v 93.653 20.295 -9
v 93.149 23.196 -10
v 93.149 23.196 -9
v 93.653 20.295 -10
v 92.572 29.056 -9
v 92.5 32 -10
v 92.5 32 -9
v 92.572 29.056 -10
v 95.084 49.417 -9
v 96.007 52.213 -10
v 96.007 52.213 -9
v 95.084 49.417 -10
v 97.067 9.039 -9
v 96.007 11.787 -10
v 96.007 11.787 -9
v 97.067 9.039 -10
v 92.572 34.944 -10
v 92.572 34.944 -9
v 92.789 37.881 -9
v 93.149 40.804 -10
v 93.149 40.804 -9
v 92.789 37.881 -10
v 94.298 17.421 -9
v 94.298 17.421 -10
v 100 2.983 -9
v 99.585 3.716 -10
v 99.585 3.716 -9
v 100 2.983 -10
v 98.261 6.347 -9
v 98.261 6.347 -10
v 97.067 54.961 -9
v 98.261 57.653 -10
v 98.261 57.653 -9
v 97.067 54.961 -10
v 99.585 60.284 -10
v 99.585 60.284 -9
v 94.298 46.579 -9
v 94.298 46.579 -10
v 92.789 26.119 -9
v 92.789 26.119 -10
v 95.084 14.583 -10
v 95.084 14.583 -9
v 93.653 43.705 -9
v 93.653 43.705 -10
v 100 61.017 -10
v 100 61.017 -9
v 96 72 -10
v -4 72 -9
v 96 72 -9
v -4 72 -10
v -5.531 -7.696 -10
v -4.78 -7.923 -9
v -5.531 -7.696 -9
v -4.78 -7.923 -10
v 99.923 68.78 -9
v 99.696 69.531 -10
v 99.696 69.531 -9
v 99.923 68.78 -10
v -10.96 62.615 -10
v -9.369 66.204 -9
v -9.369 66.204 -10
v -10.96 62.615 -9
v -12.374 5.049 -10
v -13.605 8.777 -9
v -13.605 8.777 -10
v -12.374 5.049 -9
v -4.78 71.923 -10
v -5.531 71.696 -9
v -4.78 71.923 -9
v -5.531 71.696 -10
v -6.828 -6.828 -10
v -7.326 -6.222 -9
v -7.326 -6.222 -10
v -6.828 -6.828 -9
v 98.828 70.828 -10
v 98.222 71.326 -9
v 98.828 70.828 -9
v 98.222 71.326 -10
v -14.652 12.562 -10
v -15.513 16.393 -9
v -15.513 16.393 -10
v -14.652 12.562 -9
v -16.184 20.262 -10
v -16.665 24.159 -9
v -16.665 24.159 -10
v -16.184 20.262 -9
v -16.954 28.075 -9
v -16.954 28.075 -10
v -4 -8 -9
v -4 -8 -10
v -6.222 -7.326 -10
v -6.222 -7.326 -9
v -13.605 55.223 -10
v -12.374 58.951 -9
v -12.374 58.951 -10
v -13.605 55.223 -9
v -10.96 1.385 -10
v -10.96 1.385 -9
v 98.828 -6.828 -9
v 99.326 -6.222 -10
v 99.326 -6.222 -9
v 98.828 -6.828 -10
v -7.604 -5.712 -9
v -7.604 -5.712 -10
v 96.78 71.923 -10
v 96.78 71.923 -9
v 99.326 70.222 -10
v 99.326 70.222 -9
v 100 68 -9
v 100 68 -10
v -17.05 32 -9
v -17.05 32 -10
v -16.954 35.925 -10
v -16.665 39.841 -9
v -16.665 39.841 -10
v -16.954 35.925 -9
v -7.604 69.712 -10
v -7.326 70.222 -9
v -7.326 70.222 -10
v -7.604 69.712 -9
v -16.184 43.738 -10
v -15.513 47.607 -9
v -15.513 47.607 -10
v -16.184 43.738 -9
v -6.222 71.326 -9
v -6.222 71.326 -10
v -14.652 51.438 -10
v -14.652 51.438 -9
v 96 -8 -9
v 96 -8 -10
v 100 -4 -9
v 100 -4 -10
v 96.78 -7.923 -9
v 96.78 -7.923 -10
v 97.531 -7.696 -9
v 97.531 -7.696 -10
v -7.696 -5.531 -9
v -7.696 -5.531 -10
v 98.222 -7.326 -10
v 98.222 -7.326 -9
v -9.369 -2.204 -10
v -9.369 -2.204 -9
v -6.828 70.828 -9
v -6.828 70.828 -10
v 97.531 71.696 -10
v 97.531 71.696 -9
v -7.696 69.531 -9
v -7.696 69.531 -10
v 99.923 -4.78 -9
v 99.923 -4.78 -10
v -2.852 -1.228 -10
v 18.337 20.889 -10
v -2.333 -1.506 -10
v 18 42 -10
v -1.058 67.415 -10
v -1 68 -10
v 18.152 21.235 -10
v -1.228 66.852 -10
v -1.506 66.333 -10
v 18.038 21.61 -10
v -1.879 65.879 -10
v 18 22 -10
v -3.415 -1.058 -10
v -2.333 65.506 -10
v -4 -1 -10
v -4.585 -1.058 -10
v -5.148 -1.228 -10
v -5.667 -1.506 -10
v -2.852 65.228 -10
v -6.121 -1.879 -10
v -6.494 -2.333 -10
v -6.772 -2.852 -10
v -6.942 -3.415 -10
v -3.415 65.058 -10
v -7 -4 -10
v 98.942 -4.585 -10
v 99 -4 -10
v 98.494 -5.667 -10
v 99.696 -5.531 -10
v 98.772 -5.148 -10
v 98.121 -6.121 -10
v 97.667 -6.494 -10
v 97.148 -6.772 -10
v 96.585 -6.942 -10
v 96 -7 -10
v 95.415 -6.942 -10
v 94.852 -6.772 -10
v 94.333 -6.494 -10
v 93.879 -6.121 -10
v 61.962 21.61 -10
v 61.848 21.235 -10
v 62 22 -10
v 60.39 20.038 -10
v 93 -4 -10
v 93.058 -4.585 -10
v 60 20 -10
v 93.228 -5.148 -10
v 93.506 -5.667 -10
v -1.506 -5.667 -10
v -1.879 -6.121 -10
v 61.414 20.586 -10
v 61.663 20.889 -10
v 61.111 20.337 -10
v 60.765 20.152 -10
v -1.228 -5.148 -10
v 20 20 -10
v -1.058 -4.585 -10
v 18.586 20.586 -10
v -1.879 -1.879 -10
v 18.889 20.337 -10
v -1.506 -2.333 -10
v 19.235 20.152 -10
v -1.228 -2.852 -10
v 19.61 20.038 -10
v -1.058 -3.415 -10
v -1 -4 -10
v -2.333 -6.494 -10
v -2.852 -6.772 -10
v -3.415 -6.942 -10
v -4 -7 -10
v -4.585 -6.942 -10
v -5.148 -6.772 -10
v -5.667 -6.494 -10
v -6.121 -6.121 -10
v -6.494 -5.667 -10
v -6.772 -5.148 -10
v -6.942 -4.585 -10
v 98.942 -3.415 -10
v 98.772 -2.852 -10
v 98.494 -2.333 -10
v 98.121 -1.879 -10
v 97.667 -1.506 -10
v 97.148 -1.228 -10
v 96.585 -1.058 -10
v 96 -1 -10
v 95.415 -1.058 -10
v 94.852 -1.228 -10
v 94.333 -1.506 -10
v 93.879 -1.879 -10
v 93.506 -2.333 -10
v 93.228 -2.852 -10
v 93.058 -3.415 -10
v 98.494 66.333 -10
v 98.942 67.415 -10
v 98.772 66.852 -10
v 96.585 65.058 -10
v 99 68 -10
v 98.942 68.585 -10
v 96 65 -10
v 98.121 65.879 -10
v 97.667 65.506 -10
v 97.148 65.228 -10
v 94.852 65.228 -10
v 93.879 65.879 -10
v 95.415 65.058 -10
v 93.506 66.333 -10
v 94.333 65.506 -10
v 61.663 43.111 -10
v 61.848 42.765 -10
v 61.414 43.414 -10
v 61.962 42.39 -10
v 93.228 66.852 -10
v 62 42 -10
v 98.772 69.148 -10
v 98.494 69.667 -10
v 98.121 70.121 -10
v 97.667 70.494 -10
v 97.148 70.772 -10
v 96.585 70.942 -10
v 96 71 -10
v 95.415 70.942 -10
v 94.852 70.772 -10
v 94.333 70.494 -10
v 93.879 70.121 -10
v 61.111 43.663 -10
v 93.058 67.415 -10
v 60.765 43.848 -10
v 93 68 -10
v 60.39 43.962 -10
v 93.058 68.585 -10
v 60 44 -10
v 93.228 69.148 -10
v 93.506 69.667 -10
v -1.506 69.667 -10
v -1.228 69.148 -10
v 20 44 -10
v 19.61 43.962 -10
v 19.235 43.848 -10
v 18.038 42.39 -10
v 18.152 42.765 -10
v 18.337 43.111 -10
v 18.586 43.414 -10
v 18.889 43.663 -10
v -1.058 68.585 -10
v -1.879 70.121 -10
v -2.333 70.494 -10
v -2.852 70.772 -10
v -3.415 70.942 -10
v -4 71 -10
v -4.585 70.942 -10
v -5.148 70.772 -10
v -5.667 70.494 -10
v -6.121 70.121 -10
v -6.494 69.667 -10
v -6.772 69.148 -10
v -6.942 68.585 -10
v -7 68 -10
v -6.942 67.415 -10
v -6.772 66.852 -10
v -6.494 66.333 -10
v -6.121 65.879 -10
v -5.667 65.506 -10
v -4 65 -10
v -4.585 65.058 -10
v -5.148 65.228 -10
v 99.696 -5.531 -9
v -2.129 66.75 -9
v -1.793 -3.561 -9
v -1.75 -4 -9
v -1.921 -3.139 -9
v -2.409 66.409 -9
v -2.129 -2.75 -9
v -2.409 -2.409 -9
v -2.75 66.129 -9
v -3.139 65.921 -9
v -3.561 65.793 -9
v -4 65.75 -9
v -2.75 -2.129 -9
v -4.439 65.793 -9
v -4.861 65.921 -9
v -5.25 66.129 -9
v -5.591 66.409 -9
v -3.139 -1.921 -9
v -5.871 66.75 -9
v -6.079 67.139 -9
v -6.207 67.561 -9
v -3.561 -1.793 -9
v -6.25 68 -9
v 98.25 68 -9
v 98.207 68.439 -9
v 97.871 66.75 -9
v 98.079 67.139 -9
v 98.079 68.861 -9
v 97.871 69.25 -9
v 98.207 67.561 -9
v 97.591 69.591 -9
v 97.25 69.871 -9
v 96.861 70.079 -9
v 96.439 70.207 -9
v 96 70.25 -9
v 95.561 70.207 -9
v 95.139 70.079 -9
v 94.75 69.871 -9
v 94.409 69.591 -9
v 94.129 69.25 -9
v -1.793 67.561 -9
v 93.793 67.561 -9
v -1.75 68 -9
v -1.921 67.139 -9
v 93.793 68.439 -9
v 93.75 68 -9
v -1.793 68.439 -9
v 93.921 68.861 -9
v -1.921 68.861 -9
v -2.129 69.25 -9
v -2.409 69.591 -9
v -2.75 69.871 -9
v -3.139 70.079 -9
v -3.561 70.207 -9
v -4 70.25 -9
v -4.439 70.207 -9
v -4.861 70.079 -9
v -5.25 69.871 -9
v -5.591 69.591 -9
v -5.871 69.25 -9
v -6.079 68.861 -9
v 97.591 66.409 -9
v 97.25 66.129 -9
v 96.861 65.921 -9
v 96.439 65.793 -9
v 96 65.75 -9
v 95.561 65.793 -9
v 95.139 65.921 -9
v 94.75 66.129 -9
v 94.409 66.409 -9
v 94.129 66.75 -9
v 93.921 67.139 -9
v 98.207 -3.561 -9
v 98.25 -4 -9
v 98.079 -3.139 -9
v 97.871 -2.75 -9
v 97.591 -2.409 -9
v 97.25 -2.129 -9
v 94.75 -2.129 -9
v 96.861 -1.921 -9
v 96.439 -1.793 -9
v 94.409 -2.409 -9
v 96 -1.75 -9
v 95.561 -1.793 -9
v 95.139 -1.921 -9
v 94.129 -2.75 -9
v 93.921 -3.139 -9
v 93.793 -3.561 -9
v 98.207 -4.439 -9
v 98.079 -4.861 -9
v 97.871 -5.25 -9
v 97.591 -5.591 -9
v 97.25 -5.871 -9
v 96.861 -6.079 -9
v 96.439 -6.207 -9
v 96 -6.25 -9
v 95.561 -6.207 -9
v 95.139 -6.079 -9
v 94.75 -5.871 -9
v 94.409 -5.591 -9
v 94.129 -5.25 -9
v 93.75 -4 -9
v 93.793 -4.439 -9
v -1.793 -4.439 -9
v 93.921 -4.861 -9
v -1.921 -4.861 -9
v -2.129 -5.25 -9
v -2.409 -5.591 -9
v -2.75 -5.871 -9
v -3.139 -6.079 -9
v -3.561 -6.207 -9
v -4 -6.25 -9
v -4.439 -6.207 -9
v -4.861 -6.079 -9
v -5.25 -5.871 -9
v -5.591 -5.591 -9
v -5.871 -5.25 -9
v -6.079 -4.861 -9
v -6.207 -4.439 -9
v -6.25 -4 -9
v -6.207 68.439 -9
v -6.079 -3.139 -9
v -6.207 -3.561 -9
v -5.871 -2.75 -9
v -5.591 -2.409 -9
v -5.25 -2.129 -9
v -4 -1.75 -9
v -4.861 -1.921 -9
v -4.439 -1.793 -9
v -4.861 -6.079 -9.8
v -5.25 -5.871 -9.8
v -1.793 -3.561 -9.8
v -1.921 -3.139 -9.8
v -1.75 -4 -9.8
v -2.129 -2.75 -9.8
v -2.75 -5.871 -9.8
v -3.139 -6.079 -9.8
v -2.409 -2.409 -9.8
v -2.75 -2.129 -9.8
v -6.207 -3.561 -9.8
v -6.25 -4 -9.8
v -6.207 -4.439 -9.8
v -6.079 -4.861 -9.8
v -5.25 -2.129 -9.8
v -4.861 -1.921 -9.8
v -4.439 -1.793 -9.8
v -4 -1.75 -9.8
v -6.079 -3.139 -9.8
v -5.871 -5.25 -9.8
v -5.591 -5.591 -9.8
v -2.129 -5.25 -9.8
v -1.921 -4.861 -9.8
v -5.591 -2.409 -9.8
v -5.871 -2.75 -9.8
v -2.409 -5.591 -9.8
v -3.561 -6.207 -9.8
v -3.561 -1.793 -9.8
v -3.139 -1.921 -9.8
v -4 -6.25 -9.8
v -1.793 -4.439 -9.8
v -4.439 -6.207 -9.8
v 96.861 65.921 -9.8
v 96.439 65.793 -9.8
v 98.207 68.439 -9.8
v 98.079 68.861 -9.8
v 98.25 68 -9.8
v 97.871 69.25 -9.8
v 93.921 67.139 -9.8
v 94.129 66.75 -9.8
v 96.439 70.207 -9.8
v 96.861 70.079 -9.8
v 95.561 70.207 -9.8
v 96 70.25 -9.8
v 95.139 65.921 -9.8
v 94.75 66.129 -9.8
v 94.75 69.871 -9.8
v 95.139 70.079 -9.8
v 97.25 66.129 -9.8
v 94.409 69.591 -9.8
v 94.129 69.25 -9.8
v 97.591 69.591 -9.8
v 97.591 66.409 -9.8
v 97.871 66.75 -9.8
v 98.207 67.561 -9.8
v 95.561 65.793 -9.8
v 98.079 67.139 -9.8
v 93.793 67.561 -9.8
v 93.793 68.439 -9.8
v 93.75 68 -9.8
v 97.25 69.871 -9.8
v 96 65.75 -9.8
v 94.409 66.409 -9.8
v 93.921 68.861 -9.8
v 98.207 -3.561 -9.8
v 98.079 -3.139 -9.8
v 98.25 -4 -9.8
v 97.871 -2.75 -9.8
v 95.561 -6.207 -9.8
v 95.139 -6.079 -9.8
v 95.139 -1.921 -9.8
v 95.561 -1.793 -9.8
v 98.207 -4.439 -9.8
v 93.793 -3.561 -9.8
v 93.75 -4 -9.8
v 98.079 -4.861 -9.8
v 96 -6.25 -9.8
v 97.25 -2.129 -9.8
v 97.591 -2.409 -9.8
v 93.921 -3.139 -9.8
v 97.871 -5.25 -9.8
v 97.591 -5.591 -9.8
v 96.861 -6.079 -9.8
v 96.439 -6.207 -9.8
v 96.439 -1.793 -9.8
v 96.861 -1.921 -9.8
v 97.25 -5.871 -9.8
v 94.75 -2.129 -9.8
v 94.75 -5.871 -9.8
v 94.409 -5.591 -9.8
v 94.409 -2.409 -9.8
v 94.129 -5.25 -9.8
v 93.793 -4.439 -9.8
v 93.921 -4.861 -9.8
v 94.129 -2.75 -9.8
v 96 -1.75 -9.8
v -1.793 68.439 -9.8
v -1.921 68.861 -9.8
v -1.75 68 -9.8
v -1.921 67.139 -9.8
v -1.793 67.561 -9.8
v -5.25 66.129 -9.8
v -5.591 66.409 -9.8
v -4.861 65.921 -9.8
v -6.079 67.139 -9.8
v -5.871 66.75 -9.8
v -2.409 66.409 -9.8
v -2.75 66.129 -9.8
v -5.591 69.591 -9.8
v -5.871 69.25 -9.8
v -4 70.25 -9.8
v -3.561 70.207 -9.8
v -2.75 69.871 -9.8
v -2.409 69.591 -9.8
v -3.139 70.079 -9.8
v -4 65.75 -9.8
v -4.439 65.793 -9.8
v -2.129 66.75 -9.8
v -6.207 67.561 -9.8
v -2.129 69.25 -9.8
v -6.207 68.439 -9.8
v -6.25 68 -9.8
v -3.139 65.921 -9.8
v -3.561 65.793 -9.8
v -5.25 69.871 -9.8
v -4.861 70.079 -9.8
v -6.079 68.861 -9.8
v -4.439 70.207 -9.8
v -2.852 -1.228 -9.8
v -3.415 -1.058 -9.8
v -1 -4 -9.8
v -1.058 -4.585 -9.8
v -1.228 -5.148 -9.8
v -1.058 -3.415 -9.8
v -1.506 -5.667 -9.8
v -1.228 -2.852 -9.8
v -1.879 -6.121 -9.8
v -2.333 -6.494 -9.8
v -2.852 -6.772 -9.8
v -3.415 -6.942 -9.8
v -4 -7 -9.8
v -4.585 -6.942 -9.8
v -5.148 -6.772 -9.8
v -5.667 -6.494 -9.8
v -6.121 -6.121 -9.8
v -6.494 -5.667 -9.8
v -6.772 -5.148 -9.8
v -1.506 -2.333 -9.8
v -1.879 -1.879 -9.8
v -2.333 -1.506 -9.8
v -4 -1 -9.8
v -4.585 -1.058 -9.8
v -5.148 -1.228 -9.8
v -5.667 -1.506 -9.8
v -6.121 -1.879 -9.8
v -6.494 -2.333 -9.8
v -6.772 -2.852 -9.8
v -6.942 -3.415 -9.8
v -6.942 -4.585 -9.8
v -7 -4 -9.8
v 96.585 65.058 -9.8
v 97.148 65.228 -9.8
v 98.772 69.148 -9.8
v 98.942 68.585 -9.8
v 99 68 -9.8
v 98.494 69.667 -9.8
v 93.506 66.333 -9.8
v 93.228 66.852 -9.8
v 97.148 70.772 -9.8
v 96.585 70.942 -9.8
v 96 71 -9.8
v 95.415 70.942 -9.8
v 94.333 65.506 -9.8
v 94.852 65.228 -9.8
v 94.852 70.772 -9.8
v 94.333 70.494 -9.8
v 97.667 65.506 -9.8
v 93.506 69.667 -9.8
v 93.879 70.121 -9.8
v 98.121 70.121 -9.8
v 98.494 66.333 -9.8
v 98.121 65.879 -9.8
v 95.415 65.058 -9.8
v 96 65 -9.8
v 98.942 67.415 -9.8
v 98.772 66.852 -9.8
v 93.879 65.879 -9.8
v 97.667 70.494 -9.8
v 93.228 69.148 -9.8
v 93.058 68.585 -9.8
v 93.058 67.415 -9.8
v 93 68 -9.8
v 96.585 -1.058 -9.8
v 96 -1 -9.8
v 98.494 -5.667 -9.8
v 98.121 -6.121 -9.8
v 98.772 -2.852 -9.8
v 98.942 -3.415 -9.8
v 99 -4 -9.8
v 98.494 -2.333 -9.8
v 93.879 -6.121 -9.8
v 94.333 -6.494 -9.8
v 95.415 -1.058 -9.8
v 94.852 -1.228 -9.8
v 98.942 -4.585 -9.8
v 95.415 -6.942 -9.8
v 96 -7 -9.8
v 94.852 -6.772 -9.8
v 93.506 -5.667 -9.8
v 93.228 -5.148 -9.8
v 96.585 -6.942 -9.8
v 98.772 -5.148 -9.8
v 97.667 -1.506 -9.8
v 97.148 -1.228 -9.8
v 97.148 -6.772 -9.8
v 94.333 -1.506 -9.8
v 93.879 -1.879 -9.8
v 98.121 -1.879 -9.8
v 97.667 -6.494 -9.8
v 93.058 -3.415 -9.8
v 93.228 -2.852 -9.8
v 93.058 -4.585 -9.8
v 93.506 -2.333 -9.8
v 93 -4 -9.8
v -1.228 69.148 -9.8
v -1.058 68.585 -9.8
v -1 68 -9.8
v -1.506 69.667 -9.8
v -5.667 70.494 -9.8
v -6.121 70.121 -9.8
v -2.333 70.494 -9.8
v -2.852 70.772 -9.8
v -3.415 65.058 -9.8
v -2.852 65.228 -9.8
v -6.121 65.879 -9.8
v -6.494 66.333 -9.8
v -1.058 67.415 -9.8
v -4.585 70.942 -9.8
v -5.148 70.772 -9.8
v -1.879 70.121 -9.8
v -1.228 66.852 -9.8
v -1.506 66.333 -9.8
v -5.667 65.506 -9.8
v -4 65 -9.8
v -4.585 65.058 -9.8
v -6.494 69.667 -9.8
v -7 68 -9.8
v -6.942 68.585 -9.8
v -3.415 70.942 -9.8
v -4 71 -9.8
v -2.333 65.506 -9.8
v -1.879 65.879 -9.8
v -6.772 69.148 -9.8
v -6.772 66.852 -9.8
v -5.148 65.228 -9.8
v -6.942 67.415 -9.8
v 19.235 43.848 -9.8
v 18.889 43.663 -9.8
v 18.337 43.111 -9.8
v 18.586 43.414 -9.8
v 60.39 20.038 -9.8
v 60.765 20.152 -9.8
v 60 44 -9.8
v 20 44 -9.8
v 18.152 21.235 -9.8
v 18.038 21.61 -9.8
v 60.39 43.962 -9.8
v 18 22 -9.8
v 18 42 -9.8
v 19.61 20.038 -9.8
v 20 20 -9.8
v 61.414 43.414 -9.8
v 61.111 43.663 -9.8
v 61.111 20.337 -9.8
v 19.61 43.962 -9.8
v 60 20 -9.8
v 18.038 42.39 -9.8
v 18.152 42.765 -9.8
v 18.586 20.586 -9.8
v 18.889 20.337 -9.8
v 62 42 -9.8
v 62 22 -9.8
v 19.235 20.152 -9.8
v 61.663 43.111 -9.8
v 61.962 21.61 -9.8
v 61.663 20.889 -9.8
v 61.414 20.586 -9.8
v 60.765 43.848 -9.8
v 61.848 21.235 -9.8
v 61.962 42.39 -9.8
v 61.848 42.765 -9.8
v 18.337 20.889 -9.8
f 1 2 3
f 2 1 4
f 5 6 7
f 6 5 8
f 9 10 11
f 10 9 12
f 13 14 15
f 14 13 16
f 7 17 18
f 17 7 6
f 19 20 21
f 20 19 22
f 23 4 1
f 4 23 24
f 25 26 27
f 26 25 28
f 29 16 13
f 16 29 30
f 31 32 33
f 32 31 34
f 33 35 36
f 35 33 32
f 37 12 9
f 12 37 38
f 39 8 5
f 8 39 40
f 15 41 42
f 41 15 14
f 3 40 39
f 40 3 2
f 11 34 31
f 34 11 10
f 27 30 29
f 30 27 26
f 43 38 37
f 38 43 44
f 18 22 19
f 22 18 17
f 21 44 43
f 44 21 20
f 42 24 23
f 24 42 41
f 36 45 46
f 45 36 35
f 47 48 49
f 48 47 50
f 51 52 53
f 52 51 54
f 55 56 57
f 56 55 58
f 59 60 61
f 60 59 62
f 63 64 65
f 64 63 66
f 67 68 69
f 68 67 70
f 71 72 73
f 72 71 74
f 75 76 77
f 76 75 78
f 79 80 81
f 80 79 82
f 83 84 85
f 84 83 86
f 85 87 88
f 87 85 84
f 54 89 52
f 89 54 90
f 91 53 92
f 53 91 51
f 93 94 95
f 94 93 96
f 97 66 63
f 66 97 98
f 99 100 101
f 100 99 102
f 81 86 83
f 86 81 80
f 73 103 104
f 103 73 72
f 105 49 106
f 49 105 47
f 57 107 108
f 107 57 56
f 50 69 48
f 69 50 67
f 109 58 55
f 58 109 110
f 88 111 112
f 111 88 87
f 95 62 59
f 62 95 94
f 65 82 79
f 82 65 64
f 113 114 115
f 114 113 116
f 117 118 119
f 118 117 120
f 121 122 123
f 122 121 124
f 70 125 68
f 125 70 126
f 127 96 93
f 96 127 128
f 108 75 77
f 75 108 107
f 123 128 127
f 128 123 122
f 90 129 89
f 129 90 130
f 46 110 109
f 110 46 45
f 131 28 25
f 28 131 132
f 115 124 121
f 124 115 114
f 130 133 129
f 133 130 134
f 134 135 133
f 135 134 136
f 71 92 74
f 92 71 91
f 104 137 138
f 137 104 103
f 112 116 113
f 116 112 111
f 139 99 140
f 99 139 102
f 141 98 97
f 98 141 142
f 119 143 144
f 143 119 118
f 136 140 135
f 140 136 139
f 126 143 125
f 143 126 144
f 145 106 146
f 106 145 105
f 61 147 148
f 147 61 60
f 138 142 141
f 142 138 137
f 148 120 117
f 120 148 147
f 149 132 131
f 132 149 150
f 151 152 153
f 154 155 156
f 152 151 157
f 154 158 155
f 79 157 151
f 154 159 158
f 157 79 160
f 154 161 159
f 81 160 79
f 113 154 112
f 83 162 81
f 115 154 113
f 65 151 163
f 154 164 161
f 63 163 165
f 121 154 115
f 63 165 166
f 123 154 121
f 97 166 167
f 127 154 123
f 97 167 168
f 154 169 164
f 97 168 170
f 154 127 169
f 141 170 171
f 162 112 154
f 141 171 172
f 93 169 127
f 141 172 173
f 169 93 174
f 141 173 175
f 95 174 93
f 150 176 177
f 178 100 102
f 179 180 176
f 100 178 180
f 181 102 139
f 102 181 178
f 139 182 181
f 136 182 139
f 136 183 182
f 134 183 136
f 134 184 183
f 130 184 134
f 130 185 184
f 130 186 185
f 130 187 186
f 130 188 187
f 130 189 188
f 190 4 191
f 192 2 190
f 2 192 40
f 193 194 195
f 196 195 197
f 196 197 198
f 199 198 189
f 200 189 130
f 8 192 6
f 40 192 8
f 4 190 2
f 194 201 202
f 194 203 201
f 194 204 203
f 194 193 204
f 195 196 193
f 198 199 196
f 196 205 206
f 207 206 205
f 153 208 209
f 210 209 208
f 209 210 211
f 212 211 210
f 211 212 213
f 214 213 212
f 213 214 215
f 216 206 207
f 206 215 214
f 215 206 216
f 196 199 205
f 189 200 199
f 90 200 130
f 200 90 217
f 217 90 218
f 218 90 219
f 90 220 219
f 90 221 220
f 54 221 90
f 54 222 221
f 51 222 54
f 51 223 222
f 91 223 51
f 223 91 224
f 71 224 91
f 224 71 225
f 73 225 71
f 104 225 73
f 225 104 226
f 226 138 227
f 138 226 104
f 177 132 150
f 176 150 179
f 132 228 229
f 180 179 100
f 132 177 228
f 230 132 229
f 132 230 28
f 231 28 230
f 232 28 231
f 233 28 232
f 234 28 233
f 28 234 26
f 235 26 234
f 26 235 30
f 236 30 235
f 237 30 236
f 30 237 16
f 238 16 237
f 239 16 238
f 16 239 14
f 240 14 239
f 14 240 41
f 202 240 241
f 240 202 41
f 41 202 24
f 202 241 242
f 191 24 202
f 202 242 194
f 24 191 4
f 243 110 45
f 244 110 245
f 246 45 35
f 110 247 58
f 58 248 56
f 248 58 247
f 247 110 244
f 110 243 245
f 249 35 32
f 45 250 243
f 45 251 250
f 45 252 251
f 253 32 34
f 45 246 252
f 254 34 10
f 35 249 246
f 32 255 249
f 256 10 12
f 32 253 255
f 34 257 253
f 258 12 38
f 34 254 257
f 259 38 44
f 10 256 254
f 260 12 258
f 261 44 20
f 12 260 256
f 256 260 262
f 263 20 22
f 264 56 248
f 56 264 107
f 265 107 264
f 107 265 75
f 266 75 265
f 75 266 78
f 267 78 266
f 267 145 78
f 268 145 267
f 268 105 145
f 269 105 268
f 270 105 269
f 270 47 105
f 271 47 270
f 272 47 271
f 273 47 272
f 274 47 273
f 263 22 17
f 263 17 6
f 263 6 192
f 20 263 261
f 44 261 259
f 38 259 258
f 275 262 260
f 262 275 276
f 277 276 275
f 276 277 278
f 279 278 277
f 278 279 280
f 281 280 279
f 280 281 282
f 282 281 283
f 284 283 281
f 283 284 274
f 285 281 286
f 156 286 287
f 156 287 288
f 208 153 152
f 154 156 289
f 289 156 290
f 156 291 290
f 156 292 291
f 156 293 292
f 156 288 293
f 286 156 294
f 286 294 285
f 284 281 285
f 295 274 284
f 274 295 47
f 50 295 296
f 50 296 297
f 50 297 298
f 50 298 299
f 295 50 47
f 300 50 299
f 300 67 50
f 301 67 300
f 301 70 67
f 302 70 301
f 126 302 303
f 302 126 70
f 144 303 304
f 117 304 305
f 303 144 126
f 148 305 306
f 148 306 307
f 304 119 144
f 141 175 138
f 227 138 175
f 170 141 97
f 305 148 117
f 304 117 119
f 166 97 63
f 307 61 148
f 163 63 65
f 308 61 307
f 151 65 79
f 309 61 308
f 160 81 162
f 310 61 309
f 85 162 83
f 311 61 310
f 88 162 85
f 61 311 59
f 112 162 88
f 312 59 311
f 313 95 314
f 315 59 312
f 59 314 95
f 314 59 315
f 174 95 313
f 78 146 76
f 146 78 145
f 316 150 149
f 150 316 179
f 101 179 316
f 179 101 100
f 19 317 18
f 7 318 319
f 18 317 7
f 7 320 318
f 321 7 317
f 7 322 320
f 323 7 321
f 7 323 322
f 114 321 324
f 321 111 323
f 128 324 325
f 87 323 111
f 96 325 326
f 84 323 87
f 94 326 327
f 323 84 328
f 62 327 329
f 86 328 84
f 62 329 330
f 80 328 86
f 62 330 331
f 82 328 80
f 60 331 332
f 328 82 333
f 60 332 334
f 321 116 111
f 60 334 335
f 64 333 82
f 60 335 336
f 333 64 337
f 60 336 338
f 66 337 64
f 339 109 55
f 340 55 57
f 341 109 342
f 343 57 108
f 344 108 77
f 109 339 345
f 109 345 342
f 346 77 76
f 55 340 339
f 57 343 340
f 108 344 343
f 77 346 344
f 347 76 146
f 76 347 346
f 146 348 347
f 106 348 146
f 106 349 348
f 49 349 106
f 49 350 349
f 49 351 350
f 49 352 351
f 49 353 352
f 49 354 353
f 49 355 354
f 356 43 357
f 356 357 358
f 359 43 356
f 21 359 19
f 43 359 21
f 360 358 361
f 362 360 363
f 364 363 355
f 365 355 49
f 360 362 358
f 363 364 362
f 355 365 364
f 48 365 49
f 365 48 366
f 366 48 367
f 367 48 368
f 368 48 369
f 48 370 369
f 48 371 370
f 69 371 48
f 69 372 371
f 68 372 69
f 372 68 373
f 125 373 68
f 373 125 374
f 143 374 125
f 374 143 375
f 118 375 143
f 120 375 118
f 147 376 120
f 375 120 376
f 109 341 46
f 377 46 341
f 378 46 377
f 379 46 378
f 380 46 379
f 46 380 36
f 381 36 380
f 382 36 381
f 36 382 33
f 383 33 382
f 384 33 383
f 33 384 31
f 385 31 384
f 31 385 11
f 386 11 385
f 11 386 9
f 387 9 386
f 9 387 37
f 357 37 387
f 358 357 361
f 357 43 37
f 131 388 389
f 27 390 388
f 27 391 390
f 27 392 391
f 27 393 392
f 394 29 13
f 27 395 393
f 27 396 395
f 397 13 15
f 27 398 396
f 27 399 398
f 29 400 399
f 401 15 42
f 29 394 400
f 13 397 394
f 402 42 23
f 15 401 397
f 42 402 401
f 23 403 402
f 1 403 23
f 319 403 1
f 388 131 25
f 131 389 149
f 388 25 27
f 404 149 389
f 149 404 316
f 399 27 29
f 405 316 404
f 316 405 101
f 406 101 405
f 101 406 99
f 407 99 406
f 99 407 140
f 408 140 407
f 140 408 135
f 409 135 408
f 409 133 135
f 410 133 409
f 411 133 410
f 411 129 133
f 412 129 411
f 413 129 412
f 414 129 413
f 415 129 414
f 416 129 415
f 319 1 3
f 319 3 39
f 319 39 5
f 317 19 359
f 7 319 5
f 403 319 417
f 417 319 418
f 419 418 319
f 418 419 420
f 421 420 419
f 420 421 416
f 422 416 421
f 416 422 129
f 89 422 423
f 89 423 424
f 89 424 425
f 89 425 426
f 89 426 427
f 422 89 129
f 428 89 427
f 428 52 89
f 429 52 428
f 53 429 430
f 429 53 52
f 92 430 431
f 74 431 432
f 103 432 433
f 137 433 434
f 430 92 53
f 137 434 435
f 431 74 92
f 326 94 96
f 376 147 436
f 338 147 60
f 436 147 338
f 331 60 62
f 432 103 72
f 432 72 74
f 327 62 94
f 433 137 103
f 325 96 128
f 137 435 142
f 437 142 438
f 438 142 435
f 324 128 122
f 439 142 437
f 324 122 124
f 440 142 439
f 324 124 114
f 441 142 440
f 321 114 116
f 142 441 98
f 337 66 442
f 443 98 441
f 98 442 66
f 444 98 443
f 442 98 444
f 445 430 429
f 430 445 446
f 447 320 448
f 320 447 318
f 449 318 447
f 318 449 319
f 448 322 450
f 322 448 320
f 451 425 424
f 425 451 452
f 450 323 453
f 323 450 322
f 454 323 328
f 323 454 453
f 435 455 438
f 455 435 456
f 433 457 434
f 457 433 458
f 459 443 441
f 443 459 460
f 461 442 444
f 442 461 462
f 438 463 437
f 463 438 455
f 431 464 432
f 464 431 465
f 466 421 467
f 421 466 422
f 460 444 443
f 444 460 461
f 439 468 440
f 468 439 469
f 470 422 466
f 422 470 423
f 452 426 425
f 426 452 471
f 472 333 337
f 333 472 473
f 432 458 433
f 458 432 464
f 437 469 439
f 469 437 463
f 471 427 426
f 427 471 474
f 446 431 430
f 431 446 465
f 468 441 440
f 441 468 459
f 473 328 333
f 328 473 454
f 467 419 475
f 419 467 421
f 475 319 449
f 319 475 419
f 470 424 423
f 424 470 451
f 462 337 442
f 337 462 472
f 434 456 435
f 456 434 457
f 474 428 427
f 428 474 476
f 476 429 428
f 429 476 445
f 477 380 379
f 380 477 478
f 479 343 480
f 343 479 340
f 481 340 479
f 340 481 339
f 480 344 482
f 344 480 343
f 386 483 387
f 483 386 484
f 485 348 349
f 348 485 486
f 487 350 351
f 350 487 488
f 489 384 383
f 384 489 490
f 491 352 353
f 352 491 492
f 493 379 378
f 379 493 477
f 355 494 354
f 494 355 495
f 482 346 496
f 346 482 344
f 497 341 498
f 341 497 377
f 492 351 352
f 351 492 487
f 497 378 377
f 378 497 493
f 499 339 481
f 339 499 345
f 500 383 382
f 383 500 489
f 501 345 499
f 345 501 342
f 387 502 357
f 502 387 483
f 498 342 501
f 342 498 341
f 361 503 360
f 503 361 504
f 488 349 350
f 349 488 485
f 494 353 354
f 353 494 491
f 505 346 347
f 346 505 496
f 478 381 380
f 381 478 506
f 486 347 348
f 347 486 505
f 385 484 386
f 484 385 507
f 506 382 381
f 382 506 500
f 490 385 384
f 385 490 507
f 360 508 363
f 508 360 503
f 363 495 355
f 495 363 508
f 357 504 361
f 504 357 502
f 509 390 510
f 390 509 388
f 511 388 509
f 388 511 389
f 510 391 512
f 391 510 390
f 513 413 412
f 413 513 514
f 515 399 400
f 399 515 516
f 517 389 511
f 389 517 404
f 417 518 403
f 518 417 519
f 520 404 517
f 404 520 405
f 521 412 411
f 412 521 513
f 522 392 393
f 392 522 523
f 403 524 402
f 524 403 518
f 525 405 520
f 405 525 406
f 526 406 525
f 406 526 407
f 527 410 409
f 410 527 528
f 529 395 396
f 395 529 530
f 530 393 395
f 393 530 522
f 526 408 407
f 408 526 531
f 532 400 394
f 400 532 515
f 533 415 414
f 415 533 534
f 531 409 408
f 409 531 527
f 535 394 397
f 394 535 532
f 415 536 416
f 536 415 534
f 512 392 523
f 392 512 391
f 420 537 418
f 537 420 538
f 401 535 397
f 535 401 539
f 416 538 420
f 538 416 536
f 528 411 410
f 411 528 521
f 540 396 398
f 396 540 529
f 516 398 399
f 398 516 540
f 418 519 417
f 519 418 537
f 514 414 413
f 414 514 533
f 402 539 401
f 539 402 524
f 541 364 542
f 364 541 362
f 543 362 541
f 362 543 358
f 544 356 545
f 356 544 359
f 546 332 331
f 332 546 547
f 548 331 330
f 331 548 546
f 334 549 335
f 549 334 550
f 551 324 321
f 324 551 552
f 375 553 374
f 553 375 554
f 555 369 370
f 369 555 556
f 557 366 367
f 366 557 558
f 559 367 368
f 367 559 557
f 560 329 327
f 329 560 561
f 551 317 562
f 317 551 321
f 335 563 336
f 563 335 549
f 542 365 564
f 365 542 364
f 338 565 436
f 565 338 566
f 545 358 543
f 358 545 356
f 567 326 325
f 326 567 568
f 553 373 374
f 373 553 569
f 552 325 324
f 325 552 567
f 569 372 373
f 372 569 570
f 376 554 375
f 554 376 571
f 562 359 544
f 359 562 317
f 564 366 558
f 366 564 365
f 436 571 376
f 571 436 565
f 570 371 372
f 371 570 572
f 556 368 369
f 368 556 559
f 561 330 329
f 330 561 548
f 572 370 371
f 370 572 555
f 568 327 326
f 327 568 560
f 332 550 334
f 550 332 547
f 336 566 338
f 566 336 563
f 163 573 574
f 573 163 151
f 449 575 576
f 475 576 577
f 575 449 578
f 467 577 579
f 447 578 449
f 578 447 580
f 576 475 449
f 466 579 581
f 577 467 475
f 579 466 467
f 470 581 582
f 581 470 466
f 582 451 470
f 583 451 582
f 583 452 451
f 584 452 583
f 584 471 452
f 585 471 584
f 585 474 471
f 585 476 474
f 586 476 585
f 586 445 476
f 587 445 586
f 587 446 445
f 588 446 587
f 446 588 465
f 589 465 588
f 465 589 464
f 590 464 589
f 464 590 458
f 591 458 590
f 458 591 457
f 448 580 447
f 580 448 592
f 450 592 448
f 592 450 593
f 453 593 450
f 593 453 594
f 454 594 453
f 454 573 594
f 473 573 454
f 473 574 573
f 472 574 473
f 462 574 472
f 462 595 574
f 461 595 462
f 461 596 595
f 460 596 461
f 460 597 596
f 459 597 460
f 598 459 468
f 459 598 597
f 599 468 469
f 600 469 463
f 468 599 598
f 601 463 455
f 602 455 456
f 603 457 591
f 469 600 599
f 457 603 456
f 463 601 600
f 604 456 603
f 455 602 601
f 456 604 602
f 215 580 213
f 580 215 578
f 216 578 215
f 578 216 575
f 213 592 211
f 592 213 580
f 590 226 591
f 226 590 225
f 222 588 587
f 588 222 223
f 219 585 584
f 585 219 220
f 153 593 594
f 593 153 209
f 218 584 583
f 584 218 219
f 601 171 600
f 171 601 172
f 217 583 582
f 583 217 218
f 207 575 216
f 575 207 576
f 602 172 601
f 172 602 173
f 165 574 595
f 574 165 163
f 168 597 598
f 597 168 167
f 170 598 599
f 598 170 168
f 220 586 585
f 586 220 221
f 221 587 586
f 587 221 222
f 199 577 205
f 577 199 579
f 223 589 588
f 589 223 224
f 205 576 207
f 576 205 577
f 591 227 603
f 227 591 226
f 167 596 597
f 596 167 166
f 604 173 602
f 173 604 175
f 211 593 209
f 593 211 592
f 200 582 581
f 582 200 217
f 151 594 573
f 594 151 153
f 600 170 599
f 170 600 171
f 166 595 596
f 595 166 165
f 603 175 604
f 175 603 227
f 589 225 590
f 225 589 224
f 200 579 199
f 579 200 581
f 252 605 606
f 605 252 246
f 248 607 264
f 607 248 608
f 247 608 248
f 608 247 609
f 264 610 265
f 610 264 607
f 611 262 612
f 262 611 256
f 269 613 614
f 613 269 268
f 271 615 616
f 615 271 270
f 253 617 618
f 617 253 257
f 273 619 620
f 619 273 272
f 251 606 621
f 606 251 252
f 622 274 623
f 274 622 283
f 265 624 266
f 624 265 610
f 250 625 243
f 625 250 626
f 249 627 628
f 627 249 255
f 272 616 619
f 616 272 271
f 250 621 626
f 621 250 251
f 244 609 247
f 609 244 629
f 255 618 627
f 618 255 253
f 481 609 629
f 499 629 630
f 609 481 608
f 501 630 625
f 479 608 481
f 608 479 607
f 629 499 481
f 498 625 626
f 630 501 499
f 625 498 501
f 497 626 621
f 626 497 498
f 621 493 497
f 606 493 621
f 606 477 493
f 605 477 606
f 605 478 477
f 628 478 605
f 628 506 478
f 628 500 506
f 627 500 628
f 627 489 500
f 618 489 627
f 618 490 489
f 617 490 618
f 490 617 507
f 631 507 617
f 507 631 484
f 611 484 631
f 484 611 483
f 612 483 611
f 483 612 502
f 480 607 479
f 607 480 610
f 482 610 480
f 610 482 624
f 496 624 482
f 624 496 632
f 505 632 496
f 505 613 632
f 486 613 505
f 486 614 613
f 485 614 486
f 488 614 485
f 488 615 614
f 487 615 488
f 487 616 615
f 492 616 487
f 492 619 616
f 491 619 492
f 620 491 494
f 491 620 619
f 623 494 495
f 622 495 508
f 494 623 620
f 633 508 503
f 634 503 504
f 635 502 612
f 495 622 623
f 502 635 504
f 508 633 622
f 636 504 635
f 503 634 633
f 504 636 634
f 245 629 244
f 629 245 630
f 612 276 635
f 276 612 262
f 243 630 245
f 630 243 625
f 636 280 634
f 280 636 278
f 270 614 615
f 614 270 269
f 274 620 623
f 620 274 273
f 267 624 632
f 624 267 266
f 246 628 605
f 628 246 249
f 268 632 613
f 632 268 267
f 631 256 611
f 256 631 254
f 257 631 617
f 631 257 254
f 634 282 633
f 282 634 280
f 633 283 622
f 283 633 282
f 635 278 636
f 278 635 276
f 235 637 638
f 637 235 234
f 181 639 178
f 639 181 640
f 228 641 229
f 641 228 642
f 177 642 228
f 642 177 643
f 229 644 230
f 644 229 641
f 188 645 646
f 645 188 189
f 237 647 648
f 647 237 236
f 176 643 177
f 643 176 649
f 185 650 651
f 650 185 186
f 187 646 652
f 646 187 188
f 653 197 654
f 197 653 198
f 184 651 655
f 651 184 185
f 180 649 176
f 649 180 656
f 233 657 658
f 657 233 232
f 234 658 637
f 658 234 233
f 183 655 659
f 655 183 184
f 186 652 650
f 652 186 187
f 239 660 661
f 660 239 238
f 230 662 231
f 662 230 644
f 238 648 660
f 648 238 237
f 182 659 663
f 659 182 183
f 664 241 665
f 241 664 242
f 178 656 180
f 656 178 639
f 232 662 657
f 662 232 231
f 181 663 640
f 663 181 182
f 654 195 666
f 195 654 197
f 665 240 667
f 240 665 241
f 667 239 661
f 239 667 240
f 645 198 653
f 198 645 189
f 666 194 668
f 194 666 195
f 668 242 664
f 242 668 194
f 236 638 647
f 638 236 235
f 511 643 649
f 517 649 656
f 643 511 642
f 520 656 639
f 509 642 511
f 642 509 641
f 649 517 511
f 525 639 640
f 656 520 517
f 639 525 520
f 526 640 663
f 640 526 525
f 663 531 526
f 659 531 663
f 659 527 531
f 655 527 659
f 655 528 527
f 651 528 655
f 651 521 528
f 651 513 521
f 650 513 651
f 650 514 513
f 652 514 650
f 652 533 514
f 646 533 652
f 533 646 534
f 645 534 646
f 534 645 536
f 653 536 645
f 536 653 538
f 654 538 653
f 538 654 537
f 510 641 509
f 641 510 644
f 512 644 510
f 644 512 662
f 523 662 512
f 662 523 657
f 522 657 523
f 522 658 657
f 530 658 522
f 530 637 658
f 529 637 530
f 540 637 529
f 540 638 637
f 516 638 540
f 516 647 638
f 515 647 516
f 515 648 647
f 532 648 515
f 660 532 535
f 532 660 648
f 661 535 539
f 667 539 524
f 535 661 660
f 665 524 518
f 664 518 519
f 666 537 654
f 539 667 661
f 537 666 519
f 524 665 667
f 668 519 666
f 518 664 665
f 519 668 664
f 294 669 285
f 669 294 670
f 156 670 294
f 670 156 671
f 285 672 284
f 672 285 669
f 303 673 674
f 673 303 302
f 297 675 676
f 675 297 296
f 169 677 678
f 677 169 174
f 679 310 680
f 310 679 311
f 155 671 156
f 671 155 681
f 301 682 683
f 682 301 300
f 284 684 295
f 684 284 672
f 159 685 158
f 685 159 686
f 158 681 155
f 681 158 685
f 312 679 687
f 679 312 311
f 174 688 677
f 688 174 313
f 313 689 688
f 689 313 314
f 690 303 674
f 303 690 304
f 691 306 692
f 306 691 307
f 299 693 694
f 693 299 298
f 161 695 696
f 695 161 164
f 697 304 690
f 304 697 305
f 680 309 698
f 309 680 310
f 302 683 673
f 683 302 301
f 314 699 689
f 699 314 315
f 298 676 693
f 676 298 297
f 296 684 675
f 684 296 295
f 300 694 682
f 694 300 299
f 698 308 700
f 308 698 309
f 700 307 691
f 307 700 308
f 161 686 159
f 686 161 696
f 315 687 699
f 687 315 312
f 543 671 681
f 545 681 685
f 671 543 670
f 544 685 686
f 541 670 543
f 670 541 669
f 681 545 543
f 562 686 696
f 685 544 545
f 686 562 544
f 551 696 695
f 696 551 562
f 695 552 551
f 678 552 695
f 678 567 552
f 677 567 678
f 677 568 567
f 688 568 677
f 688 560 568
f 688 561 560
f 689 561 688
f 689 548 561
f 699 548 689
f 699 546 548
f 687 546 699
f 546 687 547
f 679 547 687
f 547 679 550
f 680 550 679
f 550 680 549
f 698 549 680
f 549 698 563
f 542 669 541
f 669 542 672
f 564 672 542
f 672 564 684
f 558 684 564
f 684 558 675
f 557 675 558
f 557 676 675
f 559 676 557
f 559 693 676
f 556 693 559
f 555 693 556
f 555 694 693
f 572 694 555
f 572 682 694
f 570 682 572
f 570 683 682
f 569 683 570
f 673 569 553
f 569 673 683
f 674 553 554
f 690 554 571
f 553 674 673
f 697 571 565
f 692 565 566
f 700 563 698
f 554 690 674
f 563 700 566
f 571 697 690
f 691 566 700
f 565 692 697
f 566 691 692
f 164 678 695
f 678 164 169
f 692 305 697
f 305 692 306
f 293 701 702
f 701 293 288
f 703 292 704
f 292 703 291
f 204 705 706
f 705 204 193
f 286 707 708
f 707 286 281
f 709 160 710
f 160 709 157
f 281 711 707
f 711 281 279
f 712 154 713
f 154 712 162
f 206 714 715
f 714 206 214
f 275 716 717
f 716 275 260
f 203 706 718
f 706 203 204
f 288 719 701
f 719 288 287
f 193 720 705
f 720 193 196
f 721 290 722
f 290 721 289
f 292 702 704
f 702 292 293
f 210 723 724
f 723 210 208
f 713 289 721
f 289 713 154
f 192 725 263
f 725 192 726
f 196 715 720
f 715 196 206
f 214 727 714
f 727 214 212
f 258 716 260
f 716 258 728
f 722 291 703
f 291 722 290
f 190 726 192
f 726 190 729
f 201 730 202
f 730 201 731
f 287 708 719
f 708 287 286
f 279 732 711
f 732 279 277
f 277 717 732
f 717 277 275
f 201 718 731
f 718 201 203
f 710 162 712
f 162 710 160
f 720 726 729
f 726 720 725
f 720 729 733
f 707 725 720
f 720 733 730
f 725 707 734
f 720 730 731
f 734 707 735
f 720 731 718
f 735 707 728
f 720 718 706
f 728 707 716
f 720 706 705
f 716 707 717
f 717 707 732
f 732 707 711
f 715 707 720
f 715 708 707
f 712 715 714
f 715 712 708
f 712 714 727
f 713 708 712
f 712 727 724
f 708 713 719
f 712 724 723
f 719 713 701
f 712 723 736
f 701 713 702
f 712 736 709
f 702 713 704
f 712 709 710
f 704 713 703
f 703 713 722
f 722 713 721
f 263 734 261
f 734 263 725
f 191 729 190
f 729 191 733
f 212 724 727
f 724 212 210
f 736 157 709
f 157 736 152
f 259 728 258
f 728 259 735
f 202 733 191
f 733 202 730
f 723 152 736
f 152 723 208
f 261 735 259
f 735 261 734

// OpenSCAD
/**
 * Martin Egli
 * 2023-01-01
 */

module paper10x6cm() {
    color("White")
    translate([0, 0, 0])
    cube([100, 60, 0.1]);
}

module topCover(loc_res = 32, th = 2) {
    color("lightGray") {
        translate([0, 0, 0])
        difference() {
            hull() {
                translate([-4, -4, 0])
                cylinder(d = 8, h = th, $fn = loc_res);
                translate([100-4, 64+4, 0])
                cylinder(d = 8, h = th, $fn = loc_res);
                translate([100-4, -4, 0])
                cylinder(d = 8, h = th, $fn = loc_res);
                translate([-4, 64+4, 0])
                cylinder(d = 8, h = th, $fn = loc_res);
            
                translate([62.95, 64/2, 0])
                difference() {
                    translate([0, 0, 0])
                    cylinder(d = 160, h = th, $fn = 4*loc_res);
                    translate([-70.5, -80, -1])
                    cube([160, 160, 4]);
                }
            }
            // rounded edge cutout
            translate([152.5, 64/2, -1])
            difference() {
                translate([0, 0, -1.5])
                cylinder(d = 120, h = 5, $fn = 4*loc_res);
                translate([-52, -60, -2])
                cube([120, 120, 7]);
            }
            // M3 holes
            translate([-4, -4, -1])
            cylinder(d = 3, h = th+2, $fn = loc_res);
            translate([100-4, 64+4, -1])
            cylinder(d = 3, h = th+2, $fn = loc_res);
            translate([100-4, -4, -1])
            cylinder(d = 3, h = th+2, $fn = loc_res);
            translate([-4, 64+4, -1])
            cylinder(d = 3, h = th+2, $fn = loc_res);
        }
    }
}

module frame1(loc_res = 32, th = 1.0) {    
    color("LightGreen") {
        difference() {
            //th1
            translate([0, 0, 0]) {
                union() {
                    hull() {
                        translate([-4, -4, 0])
                        cylinder(d = 8, h = th, $fn = loc_res);
                        translate([-4, 64+4, 0])
                        cylinder(d = 8, h = th, $fn = loc_res);
                    
                        translate([62.95, 64/2, 0])
                        difference() {
                            translate([0, 0, 0])
                            cylinder(d = 160, h = th, $fn = 4*loc_res);
                            translate([-70.5, -80, -1])
                            cube([160, 160, 4]);
                        }
                    }
                    hull() {
                        translate([-4, 64+4, 0])
                        cylinder(d = 8, h = th, $fn = loc_res);
                        translate([100-4, 64+4, 0])
                        cylinder(d = 8, h = th, $fn = loc_res);
                    }
                    hull() {
                        translate([-4, -4, 0])
                        cylinder(d = 8, h = th, $fn = loc_res);
                        translate([100-4, -4, 0])
                        cylinder(d = 8, h = th, $fn = loc_res);

                    }
                }
            }
            // rounded edge cutout
            translate([152.5, 64/2, -1])
            difference() {
                translate([0, 0, -1.5])
                cylinder(d = 120, h = 5, $fn = 4*loc_res);
                translate([-52, -60, -2])
                cube([120, 120, 7]);
            }
            // M3 holes
            translate([-4, -4, -1])
            cylinder(d = 3, h = th+2, $fn = loc_res);
            translate([100-4, 64+4, -1])
            cylinder(d = 3, h = th+2, $fn = loc_res);
            translate([100-4, -4, -1])
            cylinder(d = 3, h = th+2, $fn = loc_res);
            translate([-4, 64+4, -1])
            cylinder(d = 3, h = th+2, $fn = loc_res);
        }
    }
}

module frame2(loc_res = 32, th = 6, th2 = 2) {
    color("lightBlue") {
        translate([0, 0, 0])
        difference() {
                union() {
                difference() {
                    hull() {
                        translate([-4, -4, 0])
                        cylinder(d = 8, h = th, $fn = loc_res);
                        translate([100-4, 64+4, 0])
                        cylinder(d = 8, h = th, $fn = loc_res);
                        translate([100-4, -4, 0])
                        cylinder(d = 8, h = th, $fn = loc_res);
                        translate([-4, 64+4, 0])
                        cylinder(d = 8, h = th, $fn = loc_res);
                    
                        translate([62.95, 64/2, 0])
                        difference() {
                            translate([0, 0, 0])
                            cylinder(d = 160, h = th, $fn = 4*loc_res);
                            translate([-70.5, -80, -1])
                            cube([160, 160, th+4]);
                        }
                    }
                    // rounded edge cutout
                    translate([152.5, 64/2, -1])
                    difference() {
                        translate([0, 0, -1.5])
                        cylinder(d = 120, h = th+5, $fn = 4*loc_res);
                        translate([-52, -60, -2])
                        cube([120, 120, th+5]);
                    }
                    // cut insert, so it gets hollow
                    union() {
                        translate([0, 0, -th2+1])
                        difference() {
                            hull() {
                                translate([-4, -4, 0])
                                cylinder(d = 6, h = th, $fn = loc_res);
                                translate([100-4, 64+4, 0])
                                cylinder(d = 6, h = th, $fn = loc_res);
                                translate([100-4, -4, 0])
                                cylinder(d = 6, h = th, $fn = loc_res);
                                translate([-4, 64+4, 0])
                                cylinder(d = 6, h = th, $fn = loc_res);
                            
                                translate([62.95, 64/2, 0])
                                difference() {
                                    translate([0, 0, 0])
                                    cylinder(d = 160-2, h = th, $fn = 4*loc_res);
                                    translate([-70.5, -80, -1])
                                    cube([160, 160, th+4]);
                                }
                            }
                            // rounded edge cutout
                            translate([152.5, 64/2, -1])
                            difference() {
                                translate([0, 0, -1.5])
                                cylinder(d = 120+2, h = th+5, $fn = 4*loc_res);
                                translate([-52, -60, -2])
                                cube([120, 120, th+5]);
                            }
                        }
                    }
                    // micro usb connector
                    translate([-20, 32-5, -1])
                    cube([10, 10, 6]);
                }
                // PLCC 2 x 9 mm dia holes, standoffs
                translate([-5, 0, th-th2]) {
                    translate([100*1/4, 64*1/4, 0])
                    cylinder(d = 9+4, h = th2, $fn = loc_res);
                    translate([100*3/4, 64*1/4, 0])
                    cylinder(d = 9+4, h = th2, $fn = loc_res);
                    translate([100*2/4, 64*2/4, 0])
                    cylinder(d = 9+4, h = th2, $fn = loc_res);
                    translate([100*1/4, 64*3/4, 0])
                    cylinder(d = 9+4, h = th2, $fn = loc_res);
                    translate([100*3/4, 64*3/4, 0])
                    cylinder(d = 9+4, h = th2, $fn = loc_res);
                }
                // 4.5 = M3 insert nut
                translate([-4, -4, 0])
                cylinder(d = 8, h = th, $fn = loc_res);
                translate([100-4, 64+4, 0])
                cylinder(d = 8, h = th, $fn = loc_res);
                translate([100-4, -4, 0])
                cylinder(d = 8, h = th, $fn = loc_res);
                translate([-4, 64+4, 0])
                cylinder(d = 8, h = th, $fn = loc_res);
            }
        
            // holes
            // 4.5 = M3 insert nut hole
            translate([-4, -4, -1])
            cylinder(d = 4.5, h = th+2, $fn = loc_res);
            translate([100-4, 64+4, -1])
            cylinder(d = 4.5, h = th+2, $fn = loc_res);
            translate([100-4, -4, -1])
            cylinder(d = 4.5, h = th+2, $fn = loc_res);
            translate([-4, 64+4, -1])
            cylinder(d = 4.5, h = th+2, $fn = loc_res);
            // PLCC 2 x 9 mm dia holes
            translate([-5, 0, 0]) {
                translate([100*1/4, 64*1/4, -1])
                cylinder(d = 9, h = th+2, $fn = loc_res);
                translate([100*3/4, 64*1/4, -1])
                cylinder(d = 9, h = th+2, $fn = loc_res);
                translate([100*2/4, 64*2/4, -1])
                cylinder(d = 9, h = th+2, $fn = loc_res);
                translate([100*1/4, 64*3/4, -1])
                cylinder(d = 9, h = th+2, $fn = loc_res);
                translate([100*3/4, 64*3/4, -1])
                cylinder(d = 9, h = th+2, $fn = loc_res);
            }
            // mount points
            translate([95, 32+31, 6-1.5])
            rotate([0, 90, 0])
            cylinder(d = 1, h = 10, $fn = loc_res);
            translate([95, 32-31, 6-1.5])
            rotate([0, 90, 0])
            cylinder(d = 1, h = 10, $fn = loc_res);
            translate([85, 32+50, 6-1.5])
            rotate([0, -90, 90])
            cylinder(d = 1, h = 100, $fn = loc_res);
            translate([5, 32+50, 6-1.5])
            rotate([0, -90, 90])
            cylinder(d = 1, h = 100, $fn = loc_res);
        }
    }
}

module frame3(loc_res = 32, th = 1) {
    color("LightGreen") {
        translate([0, 0, 0])
        difference() {
            hull() {
                translate([-4, -4, 0])
                cylinder(d = 8, h = th, $fn = loc_res);
                translate([100-4, 64+4, 0])
                cylinder(d = 8, h = th, $fn = loc_res);
                translate([100-4, -4, 0])
                cylinder(d = 8, h = th, $fn = loc_res);
                translate([-4, 64+4, 0])
                cylinder(d = 8, h = th, $fn = loc_res);
            
                translate([62.95, 64/2, 0])
                difference() {
                    translate([0, 0, 0])
                    cylinder(d = 160, h = th, $fn = 4*loc_res);
                    translate([-70.5, -80, -1])
                    cube([160, 160, 4]);
                }
            }
            // rounded edge cutout
            translate([152.5, 64/2, -1])
            difference() {
                translate([0, 0, -1.5])
                cylinder(d = 120, h = 5, $fn = 4*loc_res);
                translate([-52, -60, -2])
                cube([120, 120, 7]);
            }
            // 4.5 = M3 insert nut hole
            translate([-4, -4, -1])
            cylinder(d = 4.5, h = th+2, $fn = loc_res);
            translate([100-4, 64+4, -1])
            cylinder(d = 4.5, h = th+2, $fn = loc_res);
            translate([100-4, -4, -1])
            cylinder(d = 4.5, h = th+2, $fn = loc_res);
            translate([-4, 64+4, -1])
            cylinder(d = 4.5, h = th+2, $fn = loc_res);
            // 4.5 = M3 insert nut hole
            translate([-4, -4, -1])
            cylinder(d = 6, h = 1.2, $fn = loc_res);
            translate([100-4, 64+4, -1])
            cylinder(d = 6, h = 1.2, $fn = loc_res);
            translate([100-4, -4, -1])
            cylinder(d = 6, h = 1.2, $fn = loc_res);
            translate([-4, 64+4, -1])
            cylinder(d = 6, h = 1.2, $fn = loc_res);
            // label cutout
            translate([-10, 0, -0.8])
            hull() {
                translate([50-20, 32+10, 0])
                cylinder(d = 4, h = 1, $fn = loc_res);
                translate([50-20, 32-10, 0])
                cylinder(d = 4, h = 1, $fn = loc_res);
                translate([50+20, 32+10, 0])
                cylinder(d = 4, h = 1, $fn = loc_res);
                translate([50+20, 32-10, 0])
                cylinder(d = 4, h = 1, $fn = loc_res);
            }
        }
    }
}

//paper10x6cm();
*translate([0, 0, 6])
topCover();
*translate([0, 0, 2])
frame1();
*translate([0, 0, -2])
frame2();
translate([0, 0, -10])
frame3();
